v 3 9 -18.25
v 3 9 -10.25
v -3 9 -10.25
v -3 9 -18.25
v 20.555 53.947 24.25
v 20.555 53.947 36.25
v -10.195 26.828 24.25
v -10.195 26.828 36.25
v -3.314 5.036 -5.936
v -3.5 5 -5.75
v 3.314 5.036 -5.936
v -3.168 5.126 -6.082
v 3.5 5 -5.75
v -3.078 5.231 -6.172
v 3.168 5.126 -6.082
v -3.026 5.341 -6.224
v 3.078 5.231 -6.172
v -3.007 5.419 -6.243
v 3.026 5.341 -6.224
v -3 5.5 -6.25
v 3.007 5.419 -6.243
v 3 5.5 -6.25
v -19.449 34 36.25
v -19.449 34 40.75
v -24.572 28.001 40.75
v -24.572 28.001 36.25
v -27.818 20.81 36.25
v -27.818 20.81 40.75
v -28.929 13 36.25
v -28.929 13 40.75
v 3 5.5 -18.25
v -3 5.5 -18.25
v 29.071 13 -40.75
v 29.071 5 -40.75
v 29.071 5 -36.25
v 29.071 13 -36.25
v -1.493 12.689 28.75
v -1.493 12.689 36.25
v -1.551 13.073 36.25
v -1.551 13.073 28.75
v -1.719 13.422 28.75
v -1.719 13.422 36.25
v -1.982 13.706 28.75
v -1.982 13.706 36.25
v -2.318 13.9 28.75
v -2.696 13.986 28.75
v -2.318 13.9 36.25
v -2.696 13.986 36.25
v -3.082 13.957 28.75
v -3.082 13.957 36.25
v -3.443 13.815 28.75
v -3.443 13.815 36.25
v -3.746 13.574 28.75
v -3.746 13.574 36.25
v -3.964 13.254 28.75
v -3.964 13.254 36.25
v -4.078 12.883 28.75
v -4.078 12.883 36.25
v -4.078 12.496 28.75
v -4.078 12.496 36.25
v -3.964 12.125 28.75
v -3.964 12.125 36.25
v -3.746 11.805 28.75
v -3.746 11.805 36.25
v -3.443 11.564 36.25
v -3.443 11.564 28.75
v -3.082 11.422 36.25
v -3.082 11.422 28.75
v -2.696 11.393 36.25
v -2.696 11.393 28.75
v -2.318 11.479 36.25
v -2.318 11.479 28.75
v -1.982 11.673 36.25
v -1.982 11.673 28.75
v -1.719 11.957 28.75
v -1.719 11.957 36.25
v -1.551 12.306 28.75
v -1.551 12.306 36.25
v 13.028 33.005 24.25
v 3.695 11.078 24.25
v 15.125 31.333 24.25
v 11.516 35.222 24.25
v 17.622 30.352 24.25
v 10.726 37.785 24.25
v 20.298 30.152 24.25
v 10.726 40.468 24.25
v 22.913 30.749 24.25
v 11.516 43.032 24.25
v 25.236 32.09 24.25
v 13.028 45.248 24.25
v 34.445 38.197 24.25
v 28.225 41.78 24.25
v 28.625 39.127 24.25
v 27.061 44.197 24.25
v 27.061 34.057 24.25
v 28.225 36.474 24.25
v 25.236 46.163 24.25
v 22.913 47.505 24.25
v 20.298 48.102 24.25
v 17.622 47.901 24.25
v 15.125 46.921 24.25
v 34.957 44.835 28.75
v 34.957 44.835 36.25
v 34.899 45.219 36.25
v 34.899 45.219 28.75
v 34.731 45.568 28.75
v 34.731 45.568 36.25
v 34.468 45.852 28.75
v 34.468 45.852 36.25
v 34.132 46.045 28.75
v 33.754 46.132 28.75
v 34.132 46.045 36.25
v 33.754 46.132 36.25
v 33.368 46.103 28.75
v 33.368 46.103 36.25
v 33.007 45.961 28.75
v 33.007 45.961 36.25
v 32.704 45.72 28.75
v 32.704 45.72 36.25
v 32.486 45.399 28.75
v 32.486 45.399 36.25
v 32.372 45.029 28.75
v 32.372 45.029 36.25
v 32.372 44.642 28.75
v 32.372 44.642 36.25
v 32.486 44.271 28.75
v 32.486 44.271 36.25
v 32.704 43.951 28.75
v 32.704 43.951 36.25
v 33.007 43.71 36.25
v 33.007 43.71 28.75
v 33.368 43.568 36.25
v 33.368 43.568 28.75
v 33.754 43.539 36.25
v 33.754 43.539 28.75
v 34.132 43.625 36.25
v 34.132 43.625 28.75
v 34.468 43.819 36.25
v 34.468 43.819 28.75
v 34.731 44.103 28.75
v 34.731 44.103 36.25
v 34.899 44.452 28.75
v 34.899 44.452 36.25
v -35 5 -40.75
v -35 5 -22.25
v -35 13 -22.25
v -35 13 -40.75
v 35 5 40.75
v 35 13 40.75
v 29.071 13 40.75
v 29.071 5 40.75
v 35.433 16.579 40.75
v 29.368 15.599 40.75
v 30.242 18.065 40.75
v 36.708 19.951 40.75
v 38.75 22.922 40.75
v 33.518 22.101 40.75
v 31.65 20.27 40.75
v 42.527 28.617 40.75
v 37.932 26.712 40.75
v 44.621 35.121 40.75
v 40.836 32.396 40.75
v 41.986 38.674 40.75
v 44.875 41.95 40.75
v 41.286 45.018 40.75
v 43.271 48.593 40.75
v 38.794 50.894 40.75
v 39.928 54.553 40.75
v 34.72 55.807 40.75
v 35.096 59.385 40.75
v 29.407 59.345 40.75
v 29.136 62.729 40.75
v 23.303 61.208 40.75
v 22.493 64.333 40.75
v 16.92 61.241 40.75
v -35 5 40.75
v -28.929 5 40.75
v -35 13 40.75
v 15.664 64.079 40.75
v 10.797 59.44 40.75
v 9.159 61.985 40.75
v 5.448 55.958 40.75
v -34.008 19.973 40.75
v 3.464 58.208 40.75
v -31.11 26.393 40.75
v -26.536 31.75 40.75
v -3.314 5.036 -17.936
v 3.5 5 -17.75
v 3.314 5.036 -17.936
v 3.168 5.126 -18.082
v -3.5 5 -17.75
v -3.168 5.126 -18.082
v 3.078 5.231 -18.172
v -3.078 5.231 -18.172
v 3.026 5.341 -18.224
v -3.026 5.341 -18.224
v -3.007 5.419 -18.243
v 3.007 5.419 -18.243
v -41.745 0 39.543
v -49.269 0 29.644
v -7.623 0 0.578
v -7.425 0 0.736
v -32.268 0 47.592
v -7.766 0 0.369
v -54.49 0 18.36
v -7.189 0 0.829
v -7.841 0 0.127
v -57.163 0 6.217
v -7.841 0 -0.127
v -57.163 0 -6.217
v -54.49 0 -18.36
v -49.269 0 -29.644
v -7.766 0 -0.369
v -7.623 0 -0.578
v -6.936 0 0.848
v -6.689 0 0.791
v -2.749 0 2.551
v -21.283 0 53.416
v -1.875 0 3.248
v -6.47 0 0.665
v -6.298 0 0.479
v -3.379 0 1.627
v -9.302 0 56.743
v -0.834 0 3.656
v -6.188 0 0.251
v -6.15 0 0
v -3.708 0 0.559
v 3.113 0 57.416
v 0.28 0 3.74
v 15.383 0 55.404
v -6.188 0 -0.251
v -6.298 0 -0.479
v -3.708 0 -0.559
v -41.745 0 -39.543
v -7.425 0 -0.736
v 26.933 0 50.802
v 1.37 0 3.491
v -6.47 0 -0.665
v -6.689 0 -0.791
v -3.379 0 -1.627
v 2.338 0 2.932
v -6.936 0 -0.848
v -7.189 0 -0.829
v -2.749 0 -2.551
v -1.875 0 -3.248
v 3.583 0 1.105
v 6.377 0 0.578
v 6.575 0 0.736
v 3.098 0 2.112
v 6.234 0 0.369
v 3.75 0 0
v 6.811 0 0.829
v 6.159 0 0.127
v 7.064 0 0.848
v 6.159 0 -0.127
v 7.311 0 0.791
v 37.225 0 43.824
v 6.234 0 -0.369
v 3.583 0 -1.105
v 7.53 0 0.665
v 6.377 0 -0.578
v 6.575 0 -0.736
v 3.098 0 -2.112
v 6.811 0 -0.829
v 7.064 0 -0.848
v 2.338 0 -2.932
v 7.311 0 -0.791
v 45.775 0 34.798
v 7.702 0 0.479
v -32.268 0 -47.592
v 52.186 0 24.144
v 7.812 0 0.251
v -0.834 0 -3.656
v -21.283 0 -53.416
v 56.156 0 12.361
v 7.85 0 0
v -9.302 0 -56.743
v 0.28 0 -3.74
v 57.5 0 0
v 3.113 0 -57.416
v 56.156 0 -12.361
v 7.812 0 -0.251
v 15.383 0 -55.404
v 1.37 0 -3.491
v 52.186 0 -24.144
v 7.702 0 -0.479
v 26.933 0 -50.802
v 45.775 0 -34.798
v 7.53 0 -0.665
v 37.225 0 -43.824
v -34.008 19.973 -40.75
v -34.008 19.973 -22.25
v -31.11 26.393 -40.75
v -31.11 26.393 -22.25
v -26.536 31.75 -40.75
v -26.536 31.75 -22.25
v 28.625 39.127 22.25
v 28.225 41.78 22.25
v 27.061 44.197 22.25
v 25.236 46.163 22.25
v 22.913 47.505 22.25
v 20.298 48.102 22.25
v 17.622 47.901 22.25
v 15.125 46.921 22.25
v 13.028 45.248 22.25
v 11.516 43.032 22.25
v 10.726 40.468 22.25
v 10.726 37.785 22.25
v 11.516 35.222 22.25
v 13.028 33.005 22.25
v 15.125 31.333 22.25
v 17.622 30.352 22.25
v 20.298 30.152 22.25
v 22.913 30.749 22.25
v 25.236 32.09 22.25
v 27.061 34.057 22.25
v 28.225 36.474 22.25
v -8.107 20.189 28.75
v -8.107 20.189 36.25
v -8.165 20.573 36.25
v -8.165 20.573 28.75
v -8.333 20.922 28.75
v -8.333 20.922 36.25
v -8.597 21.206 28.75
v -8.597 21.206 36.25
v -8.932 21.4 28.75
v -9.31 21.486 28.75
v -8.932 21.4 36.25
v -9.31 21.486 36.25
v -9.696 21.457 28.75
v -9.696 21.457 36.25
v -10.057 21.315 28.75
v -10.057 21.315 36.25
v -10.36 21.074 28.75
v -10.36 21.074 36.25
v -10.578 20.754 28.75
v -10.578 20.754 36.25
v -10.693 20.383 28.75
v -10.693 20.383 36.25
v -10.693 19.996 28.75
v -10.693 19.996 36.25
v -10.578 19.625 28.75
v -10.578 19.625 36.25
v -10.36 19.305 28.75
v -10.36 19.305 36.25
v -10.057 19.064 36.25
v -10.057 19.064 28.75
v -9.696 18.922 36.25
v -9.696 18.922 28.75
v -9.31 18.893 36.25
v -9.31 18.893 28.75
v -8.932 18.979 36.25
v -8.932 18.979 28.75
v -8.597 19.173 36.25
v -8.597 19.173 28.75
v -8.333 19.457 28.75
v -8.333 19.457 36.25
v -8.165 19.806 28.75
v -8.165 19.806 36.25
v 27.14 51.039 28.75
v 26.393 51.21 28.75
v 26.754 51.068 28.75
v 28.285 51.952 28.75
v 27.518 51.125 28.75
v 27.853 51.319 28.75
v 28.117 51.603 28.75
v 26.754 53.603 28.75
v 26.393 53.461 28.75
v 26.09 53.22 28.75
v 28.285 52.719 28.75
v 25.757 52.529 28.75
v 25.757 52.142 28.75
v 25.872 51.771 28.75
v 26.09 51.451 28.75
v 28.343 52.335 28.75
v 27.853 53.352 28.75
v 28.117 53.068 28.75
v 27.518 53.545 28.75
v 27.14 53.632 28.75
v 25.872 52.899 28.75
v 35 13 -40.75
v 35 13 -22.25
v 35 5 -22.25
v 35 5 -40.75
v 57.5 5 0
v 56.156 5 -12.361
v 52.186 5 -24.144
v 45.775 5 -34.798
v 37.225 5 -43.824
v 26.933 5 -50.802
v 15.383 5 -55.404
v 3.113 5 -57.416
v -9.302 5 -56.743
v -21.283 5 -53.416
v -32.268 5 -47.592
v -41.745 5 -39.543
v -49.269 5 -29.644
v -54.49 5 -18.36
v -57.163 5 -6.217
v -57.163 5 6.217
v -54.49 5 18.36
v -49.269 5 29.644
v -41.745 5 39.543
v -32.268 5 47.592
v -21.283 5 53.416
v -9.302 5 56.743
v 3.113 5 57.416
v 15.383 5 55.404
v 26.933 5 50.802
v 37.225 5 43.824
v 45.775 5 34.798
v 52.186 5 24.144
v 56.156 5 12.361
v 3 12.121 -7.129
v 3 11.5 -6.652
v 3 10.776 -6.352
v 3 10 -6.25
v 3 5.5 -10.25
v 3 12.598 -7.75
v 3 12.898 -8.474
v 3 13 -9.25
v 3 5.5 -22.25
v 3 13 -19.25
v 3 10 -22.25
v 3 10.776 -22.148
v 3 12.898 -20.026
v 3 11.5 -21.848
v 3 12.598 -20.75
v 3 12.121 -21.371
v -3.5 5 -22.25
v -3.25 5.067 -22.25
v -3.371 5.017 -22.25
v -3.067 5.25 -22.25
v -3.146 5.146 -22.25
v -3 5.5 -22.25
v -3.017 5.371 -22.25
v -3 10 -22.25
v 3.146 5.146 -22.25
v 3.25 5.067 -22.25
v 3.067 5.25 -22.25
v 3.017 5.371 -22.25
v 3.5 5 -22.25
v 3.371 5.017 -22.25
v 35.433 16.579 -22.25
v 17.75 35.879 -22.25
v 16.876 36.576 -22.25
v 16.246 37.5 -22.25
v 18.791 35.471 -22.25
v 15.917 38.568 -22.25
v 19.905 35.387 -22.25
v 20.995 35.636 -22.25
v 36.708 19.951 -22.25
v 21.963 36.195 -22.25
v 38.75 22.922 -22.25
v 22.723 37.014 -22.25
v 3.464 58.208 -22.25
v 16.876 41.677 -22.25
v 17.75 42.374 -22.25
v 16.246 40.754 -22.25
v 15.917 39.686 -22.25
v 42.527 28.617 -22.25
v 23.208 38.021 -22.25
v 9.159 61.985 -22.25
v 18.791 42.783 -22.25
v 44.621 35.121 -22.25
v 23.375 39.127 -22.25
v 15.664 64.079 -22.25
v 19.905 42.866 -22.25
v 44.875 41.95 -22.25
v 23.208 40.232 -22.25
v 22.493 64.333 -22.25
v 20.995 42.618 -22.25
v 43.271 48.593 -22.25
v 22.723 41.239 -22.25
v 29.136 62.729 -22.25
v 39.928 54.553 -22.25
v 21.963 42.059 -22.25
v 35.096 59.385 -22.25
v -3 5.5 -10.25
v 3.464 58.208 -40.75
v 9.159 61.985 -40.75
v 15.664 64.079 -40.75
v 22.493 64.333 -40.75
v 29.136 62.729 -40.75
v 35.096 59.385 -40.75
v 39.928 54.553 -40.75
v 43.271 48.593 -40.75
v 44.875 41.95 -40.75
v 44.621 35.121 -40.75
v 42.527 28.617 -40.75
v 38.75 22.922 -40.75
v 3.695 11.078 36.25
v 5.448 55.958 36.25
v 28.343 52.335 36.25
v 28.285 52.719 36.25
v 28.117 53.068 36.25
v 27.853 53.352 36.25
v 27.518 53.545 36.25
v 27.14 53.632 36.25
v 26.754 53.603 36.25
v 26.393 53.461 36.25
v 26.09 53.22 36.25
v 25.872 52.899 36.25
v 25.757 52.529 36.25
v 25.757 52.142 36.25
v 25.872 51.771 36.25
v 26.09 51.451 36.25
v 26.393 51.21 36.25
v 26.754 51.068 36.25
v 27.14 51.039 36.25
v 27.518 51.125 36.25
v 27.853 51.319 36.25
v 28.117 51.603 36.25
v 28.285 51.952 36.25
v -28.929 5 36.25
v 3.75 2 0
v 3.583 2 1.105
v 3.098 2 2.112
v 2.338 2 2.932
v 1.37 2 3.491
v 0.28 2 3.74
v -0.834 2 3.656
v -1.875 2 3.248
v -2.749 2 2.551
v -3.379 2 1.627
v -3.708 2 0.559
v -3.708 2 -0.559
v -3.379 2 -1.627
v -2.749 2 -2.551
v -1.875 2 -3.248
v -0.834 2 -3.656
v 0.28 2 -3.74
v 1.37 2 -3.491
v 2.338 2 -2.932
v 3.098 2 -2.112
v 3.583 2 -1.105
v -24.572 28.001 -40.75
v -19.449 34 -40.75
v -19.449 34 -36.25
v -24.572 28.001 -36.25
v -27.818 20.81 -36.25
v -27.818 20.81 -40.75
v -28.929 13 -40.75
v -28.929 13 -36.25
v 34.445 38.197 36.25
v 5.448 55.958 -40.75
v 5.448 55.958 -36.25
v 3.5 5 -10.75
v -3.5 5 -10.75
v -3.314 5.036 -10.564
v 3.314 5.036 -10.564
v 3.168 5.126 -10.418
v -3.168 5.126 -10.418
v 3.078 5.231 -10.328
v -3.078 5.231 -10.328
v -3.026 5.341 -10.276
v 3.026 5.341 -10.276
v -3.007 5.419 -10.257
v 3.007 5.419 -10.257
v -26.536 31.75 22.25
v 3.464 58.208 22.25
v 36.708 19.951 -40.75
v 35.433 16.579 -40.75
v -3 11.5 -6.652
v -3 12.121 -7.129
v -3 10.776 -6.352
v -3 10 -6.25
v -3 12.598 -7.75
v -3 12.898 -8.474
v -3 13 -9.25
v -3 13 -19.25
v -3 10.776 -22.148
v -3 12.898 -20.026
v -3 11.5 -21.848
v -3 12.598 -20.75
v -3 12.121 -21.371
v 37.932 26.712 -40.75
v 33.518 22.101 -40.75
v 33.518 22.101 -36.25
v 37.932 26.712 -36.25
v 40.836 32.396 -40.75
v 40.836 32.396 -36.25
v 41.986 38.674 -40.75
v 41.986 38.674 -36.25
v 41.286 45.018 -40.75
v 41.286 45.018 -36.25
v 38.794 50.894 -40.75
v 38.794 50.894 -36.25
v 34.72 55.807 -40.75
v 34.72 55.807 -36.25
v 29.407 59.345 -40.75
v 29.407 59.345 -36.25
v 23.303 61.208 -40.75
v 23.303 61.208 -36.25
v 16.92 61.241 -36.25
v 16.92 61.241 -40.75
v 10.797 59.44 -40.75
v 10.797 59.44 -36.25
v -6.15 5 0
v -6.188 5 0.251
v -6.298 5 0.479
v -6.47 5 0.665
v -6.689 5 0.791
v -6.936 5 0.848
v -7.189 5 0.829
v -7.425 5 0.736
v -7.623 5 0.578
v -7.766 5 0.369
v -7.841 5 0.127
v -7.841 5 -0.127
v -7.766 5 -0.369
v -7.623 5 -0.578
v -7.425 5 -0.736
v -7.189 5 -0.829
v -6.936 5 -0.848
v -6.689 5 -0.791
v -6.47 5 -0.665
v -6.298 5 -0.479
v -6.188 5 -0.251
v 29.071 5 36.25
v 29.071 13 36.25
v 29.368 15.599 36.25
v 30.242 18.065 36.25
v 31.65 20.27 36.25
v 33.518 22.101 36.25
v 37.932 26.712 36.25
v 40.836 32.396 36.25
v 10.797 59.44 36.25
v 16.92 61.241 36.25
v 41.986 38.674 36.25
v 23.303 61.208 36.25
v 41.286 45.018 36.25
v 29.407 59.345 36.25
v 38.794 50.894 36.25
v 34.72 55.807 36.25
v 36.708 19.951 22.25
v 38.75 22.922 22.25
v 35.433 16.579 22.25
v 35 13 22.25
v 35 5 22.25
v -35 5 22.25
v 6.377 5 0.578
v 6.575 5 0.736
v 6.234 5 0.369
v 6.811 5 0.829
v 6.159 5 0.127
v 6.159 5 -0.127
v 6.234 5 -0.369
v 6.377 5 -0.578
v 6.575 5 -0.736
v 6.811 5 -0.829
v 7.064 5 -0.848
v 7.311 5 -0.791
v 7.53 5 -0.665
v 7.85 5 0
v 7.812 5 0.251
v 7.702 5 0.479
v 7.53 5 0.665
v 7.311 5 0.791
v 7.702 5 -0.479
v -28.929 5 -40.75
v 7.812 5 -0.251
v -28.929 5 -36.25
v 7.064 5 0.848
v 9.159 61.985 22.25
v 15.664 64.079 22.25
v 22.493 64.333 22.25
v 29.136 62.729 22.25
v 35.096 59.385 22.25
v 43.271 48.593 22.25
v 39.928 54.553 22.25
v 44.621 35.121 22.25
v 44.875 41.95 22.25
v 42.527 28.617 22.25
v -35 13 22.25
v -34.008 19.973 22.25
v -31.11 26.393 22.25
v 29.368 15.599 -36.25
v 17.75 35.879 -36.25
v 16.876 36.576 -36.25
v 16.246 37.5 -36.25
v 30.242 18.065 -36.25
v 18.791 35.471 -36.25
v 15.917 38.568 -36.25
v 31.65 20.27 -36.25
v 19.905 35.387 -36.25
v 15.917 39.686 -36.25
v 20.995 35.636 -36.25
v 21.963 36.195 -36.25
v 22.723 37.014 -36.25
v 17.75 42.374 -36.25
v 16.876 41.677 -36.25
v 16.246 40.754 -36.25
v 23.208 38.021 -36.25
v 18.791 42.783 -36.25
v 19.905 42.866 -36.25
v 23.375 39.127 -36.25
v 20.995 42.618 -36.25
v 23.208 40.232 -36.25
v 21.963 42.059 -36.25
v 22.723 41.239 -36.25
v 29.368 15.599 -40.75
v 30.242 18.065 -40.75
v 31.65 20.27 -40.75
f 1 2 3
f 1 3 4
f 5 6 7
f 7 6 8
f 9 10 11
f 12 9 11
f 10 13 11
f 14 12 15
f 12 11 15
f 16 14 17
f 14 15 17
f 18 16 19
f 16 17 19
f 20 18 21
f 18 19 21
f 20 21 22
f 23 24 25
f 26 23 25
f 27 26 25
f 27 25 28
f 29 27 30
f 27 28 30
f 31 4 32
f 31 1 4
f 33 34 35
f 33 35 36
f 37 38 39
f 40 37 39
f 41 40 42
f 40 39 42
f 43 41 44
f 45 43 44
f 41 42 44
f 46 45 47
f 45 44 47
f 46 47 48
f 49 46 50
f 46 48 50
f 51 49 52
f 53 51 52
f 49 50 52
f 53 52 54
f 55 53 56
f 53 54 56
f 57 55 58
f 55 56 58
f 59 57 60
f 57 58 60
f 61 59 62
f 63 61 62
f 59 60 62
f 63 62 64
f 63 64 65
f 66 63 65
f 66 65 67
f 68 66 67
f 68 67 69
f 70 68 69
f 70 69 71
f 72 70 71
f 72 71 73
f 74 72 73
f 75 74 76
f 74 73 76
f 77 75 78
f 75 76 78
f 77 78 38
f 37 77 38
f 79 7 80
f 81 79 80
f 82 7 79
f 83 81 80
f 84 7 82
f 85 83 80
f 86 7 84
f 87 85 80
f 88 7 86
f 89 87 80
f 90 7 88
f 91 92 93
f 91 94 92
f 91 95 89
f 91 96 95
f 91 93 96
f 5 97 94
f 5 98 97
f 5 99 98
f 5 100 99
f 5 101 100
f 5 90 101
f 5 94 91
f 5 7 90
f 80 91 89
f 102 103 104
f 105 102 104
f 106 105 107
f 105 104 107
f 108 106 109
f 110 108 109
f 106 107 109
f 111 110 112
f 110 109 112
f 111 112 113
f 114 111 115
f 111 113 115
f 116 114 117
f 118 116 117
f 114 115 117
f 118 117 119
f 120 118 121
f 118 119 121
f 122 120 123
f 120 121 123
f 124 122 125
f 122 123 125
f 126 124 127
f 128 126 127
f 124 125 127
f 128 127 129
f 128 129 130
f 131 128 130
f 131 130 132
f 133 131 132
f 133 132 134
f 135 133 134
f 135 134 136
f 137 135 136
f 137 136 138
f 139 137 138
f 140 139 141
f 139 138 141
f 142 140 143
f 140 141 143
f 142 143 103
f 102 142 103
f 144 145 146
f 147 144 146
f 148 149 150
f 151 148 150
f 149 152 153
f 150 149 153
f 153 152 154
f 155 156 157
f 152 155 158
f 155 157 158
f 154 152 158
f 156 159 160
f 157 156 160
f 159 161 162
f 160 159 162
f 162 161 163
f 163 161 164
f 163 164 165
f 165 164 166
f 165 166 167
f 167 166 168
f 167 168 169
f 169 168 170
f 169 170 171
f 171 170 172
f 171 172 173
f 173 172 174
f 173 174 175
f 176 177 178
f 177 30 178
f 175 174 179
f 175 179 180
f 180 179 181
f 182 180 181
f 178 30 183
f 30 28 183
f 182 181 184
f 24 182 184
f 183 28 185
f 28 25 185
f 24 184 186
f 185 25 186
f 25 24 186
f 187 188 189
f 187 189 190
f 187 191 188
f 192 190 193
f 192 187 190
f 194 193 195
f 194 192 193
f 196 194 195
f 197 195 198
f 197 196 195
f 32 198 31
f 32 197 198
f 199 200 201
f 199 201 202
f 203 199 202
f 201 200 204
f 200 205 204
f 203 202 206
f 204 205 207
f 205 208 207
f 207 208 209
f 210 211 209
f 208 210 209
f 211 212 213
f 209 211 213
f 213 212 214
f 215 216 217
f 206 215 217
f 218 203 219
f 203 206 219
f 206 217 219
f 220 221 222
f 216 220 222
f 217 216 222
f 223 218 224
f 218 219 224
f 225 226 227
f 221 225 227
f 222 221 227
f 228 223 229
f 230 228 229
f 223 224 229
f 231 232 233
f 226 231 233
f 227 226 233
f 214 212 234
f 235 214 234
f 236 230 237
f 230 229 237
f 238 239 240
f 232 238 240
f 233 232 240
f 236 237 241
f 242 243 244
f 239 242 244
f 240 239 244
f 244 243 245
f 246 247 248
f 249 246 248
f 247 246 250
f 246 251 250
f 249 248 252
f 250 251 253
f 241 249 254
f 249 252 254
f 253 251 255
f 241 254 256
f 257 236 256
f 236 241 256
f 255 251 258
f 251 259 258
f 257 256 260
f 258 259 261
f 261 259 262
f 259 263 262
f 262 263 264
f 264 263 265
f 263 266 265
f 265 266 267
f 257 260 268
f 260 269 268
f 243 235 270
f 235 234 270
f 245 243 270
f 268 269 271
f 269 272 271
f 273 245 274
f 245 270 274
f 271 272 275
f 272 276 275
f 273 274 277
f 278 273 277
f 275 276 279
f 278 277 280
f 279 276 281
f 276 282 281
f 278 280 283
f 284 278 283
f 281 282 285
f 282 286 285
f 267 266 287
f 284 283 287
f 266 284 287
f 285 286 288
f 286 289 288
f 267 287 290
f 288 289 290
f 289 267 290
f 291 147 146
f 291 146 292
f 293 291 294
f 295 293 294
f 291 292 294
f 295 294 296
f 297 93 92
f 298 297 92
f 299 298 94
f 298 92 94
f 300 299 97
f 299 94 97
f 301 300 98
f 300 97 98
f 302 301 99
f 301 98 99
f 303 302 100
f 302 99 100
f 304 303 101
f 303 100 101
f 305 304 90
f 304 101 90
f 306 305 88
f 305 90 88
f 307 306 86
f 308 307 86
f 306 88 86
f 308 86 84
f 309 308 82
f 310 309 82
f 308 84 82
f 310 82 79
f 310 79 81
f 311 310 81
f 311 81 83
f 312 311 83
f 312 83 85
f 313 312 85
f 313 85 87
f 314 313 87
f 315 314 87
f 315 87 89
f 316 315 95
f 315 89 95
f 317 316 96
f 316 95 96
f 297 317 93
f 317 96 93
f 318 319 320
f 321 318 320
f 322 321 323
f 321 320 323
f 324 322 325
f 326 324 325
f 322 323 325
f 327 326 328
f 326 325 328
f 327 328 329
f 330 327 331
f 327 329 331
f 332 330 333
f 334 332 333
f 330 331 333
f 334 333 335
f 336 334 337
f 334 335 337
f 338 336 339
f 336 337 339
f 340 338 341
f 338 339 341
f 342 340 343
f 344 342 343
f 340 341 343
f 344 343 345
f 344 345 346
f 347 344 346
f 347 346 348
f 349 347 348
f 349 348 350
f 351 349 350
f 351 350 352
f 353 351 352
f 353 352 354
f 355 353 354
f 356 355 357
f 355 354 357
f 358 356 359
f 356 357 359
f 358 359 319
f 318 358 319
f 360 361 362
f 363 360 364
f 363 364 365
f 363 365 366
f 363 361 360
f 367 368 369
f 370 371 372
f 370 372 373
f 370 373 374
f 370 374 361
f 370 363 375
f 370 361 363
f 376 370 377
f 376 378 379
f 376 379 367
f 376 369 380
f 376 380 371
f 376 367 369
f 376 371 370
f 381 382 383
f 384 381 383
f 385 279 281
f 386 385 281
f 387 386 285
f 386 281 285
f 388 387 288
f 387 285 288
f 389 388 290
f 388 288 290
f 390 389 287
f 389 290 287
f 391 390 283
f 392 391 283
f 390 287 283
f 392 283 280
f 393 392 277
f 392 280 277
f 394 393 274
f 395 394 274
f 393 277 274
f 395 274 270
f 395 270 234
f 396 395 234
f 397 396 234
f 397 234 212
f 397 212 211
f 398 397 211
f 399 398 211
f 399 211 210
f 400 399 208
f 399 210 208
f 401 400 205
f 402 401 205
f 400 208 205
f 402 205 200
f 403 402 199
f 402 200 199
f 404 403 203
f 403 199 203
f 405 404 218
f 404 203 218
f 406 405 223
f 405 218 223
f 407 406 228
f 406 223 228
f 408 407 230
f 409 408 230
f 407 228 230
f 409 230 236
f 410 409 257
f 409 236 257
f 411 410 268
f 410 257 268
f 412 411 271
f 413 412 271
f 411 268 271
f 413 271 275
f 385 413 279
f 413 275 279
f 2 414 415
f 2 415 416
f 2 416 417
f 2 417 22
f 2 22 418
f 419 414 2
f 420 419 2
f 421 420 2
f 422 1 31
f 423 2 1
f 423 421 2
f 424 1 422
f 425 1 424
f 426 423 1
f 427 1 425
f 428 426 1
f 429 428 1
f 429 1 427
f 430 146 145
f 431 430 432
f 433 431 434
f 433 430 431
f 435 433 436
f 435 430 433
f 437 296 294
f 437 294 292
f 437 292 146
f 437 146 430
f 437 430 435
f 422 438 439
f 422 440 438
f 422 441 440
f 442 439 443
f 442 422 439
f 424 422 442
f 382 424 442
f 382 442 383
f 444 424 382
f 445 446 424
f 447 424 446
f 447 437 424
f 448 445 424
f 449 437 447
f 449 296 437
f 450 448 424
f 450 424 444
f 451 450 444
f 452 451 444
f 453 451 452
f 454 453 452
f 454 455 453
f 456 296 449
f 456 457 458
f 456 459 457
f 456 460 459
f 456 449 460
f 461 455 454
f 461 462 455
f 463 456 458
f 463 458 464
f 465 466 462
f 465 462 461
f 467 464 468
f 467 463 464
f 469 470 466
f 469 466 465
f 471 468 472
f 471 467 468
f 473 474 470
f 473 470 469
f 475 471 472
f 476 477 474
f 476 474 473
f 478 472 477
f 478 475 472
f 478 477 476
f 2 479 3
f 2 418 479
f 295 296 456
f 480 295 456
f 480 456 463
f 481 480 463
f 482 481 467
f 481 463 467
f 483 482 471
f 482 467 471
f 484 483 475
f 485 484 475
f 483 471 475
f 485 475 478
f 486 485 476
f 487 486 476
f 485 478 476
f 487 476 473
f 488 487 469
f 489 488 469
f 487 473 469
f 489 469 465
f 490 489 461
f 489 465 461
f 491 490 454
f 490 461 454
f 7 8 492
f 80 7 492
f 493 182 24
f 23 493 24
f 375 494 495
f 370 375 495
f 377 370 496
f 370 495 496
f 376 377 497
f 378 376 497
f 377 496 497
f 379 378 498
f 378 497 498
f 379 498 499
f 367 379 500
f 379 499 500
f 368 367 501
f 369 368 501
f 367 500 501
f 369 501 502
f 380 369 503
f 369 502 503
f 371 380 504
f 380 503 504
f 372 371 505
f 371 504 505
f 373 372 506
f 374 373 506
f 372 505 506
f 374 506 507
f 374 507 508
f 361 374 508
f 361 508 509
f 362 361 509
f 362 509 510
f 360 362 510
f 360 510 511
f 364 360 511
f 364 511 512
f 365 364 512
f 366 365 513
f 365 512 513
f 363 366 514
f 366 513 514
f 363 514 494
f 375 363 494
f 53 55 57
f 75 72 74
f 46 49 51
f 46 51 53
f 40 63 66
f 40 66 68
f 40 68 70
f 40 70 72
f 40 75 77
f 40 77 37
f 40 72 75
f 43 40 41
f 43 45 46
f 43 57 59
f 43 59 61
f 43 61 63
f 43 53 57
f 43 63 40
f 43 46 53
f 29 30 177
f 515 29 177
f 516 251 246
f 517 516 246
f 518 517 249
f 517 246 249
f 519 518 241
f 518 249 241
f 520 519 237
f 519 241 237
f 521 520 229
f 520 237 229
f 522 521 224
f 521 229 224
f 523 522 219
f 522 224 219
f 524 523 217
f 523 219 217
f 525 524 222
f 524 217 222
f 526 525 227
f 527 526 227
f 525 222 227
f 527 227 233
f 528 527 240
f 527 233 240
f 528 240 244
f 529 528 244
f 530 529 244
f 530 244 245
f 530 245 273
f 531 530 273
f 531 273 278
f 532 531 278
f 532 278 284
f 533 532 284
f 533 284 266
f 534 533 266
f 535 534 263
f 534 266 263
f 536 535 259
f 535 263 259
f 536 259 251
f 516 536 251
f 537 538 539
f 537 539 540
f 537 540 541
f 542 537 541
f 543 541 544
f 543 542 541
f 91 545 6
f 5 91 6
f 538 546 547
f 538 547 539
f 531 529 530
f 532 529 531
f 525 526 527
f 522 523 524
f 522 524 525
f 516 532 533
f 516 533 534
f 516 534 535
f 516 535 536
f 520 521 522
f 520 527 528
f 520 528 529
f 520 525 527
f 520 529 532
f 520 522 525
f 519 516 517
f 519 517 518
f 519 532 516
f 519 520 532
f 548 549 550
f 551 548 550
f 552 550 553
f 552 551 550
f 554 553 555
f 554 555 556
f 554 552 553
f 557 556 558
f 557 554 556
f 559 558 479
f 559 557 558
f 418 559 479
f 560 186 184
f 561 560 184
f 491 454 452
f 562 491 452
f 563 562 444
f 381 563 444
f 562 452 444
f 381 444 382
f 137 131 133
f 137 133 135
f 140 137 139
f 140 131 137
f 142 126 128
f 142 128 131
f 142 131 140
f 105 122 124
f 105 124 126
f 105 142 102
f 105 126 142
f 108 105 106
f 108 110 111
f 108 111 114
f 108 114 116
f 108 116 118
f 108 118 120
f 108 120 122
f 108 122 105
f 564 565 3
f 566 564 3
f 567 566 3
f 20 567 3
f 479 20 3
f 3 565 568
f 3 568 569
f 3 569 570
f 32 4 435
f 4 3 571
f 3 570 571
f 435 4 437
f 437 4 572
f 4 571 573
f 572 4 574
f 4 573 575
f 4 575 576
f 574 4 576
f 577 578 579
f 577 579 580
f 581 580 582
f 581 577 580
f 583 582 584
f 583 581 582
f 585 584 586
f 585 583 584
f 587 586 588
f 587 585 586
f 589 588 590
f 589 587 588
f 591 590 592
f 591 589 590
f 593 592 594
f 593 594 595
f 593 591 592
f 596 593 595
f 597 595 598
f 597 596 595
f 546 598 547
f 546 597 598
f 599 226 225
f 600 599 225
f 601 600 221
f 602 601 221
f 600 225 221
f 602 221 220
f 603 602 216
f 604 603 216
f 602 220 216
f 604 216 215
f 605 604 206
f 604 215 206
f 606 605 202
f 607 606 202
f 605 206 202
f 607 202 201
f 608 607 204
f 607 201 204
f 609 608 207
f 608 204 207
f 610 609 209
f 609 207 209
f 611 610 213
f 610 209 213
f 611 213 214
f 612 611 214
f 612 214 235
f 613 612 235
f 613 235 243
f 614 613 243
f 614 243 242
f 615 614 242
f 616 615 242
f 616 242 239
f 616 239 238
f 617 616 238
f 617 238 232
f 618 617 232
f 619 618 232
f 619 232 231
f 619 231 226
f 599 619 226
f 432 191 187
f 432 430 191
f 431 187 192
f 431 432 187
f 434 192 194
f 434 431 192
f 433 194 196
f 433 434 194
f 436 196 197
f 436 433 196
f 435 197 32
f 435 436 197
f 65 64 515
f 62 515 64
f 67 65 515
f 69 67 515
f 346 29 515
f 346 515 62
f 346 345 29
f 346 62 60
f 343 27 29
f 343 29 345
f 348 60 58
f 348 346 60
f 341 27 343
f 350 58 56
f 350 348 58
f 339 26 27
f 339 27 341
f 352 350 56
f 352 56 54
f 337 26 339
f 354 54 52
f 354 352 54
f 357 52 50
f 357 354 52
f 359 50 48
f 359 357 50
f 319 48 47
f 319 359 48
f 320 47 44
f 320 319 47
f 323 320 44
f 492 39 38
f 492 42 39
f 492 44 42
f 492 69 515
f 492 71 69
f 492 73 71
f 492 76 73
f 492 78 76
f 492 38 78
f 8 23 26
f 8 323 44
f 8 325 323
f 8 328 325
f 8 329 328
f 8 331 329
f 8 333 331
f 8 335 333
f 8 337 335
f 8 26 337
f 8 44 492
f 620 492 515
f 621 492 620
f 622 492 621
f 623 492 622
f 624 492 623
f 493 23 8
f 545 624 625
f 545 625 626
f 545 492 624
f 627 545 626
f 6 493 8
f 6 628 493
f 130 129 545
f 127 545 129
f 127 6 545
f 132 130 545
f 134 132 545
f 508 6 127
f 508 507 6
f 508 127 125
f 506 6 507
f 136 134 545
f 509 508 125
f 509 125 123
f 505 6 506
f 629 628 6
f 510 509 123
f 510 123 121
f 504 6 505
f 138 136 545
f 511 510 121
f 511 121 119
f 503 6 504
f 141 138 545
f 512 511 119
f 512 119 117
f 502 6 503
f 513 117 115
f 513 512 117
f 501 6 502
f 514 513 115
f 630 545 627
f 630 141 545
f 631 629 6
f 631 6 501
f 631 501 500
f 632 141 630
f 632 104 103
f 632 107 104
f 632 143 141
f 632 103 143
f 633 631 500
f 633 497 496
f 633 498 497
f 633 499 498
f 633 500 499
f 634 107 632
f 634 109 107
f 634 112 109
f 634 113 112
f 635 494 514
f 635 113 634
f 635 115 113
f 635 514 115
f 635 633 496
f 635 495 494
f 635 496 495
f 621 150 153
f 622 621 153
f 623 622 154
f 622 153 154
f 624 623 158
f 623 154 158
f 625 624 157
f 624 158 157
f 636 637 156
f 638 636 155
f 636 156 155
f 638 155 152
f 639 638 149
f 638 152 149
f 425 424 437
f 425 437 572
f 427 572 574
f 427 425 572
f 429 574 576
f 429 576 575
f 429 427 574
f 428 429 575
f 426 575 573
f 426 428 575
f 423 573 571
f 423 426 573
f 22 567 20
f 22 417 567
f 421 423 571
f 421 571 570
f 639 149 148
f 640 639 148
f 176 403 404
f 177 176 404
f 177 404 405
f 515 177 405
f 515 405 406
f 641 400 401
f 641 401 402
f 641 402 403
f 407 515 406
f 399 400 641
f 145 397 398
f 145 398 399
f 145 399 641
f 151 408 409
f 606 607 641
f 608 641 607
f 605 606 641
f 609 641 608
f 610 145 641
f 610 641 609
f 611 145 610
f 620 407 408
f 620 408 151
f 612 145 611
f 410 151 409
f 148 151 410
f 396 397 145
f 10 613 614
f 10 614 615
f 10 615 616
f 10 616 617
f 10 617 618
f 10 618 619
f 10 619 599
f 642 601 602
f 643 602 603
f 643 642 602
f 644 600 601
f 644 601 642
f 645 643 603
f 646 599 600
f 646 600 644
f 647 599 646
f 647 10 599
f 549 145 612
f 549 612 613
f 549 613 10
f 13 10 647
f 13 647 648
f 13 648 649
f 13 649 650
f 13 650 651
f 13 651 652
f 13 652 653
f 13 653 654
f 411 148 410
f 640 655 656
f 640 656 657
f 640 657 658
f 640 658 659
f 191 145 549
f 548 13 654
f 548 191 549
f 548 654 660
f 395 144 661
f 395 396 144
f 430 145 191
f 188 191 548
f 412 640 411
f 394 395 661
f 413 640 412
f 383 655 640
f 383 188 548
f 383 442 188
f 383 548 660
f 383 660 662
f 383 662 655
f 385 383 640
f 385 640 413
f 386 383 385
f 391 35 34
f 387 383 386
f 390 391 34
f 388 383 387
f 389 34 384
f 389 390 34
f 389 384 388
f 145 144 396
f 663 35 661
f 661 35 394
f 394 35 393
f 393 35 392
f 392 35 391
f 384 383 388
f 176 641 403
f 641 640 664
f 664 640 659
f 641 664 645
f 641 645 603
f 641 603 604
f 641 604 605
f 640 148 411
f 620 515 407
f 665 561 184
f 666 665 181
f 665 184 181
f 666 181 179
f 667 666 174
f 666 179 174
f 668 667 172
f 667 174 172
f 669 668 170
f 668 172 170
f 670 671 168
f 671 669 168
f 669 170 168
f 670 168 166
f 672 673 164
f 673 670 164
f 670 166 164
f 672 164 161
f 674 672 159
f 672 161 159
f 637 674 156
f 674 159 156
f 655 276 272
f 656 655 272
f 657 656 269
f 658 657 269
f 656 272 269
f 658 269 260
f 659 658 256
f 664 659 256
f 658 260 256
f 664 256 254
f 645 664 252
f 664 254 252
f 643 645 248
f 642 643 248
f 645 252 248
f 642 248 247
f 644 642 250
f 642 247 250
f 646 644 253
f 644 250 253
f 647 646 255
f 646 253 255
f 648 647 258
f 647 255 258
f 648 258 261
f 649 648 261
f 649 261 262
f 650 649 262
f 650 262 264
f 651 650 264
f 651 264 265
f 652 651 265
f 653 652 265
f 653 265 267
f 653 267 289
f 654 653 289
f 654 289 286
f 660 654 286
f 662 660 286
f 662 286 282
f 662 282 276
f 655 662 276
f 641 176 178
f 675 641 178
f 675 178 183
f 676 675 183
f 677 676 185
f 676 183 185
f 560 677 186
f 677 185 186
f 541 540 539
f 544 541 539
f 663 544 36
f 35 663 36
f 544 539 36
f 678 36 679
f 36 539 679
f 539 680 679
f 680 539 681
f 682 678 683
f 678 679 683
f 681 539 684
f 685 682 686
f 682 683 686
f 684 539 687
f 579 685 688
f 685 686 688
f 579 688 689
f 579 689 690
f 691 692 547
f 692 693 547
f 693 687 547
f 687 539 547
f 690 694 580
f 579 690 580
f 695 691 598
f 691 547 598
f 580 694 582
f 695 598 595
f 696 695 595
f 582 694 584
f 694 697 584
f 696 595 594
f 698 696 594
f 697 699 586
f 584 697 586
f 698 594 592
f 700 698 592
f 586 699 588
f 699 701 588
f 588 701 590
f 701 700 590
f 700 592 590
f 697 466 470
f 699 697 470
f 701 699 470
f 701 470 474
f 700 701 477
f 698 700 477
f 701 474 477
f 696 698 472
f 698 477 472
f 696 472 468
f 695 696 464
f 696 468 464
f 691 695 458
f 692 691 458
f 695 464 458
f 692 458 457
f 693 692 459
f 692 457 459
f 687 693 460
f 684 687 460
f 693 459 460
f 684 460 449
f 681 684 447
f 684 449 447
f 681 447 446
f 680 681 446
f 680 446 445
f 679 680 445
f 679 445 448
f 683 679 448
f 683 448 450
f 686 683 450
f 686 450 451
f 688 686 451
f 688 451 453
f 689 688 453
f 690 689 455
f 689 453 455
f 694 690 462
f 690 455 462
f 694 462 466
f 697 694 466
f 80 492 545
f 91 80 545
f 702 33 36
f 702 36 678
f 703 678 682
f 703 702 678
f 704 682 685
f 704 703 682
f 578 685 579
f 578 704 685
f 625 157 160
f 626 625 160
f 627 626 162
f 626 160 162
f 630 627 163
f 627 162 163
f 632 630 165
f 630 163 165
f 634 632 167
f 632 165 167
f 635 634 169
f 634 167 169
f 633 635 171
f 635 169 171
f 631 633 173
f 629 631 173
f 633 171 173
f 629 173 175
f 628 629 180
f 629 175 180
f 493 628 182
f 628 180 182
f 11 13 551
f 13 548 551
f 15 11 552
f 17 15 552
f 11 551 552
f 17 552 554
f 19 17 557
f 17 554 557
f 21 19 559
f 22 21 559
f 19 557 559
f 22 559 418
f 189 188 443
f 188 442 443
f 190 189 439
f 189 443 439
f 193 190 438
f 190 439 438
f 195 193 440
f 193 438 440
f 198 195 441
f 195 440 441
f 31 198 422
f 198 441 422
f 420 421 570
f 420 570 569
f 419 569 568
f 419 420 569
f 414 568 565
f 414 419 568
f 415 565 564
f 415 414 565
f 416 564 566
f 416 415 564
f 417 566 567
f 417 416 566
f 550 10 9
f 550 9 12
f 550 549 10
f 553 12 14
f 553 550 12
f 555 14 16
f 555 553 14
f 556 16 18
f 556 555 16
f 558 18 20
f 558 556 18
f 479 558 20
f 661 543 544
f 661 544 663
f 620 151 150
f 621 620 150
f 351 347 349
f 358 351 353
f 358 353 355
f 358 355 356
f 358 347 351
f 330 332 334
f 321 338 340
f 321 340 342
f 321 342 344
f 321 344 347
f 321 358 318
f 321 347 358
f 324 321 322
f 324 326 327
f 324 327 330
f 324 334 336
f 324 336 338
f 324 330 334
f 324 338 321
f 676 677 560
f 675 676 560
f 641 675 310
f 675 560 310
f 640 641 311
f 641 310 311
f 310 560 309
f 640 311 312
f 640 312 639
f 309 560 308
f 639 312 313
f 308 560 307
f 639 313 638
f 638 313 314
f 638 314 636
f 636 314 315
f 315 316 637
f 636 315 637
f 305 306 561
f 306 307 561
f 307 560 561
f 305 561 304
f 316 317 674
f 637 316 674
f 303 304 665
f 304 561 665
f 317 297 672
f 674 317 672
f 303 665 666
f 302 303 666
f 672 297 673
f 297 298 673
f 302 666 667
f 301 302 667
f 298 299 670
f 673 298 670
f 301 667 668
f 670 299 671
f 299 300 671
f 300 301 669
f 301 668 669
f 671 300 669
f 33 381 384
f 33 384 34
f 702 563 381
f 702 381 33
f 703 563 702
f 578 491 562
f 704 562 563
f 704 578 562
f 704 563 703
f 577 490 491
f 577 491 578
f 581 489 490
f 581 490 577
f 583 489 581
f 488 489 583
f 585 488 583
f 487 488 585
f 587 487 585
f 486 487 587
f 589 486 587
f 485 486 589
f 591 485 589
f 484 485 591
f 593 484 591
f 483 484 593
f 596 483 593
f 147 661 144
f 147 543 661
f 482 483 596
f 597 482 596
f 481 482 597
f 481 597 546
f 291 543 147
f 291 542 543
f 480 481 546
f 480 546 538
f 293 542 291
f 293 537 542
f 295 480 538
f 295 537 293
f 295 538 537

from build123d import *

# Parameters (mm, degrees)
SKETCH1_R           = 57.5
BOSS_EXTRUDE1_DEPTH = 5
BOSS_EXTRUDE2_DEPTH = 40.75
CUT_EXTRUDE1_DEPTH  = 22.25
CUT_EXTRUDE2_DEPTH  = 4.5
CUT_EXTRUDE3_DEPTH  = 12
SKETCH7_R           = 9
CUT_EXTRUDE5_DEPTH  = 2
SKETCH8_R           = 1.3
CUT_EXTRUDE6_DEPTH  = 7.5
SKETCH10_R          = 3.75
CUT_EXTRUDE7_DEPTH  = 14
SKETCH11_R          = 3.75
CUT_EXTRUDE8_DEPTH  = 2
CUT_EXTRUDE9_REACH  = 66.458
SKETCH12_R          = 0.85
BOSS_EXTRUDE3_DEPTH = 3
FILLET1_R           = 0.5


with BuildPart() as part:
    # Sketch1 → Boss-Extrude1 (new body)
    with BuildSketch(Plane(origin=(0, 0, 0), x_dir=(1, 0, 0), z_dir=(0, 1, 0))):
        Circle(SKETCH1_R)
    extrude(amount=BOSS_EXTRUDE1_DEPTH)

    # Sketch2 → Boss-Extrude2 (add, symmetric)
    with BuildSketch(Plane.XY):
        with BuildLine():
            Line((-35, 5), (-35, 13))
            ThreePointArc((-35, 13), (-32.785945694, 23.285945694), (-26.535945694, 31.75))
            Line((-26.535945694, 31.75), (3.464054306, 58.207513111))
            ThreePointArc((3.464054306, 58.207513111), (37.67766953, 57.13518264), (38.75, 22.921567416))
            ThreePointArc((38.75, 22.921567416), (35.9687848, 18.303300859), (35, 13))
            Line((35, 13), (35, 5))
            Line((35, 5), (-35, 5))
        make_face()
    extrude(amount=BOSS_EXTRUDE2_DEPTH, both=True)

    # Sketch4 → Cut-Extrude1 (cut, symmetric)
    with BuildSketch(Plane.XY):
        with BuildLine():
            Line((3.464054306, 58.207513111), (-26.535945694, 31.75))
            ThreePointArc((-26.535945694, 31.75), (-32.785945694, 23.285945694), (-35, 13))
            Line((-35, 13), (-35, 5))
            Line((-35, 5), (35, 5))
            Line((35, 5), (35, 13))
            ThreePointArc((35, 13), (35.9687848, 18.303300859), (38.75, 22.921567416))
            ThreePointArc((38.75, 22.921567416), (37.67766953, 57.13518264), (3.464054306, 58.207513111))
        make_face()
    extrude(amount=CUT_EXTRUDE1_DEPTH, both=True, mode=Mode.SUBTRACT)

    # Sketch5 → Cut-Extrude2 (cut)
    with BuildSketch(Plane.XY.offset(40.75)):
        with BuildLine():
            Line((5.448367789, 55.957513111), (-19.449111825, 34))
            ThreePointArc((-19.449111825, 34), (-26.449111825, 24.520259177), (-28.928852648, 13))
            Line((-28.928852648, 13), (-28.928852648, 5))
            Line((-28.928852648, 5), (29.071147352, 5))
            Line((29.071147352, 5), (29.071147352, 13))
            ThreePointArc((29.071147352, 13), (30.242434209, 18.064703602), (33.518438806, 22.100905947))
            ThreePointArc((33.518438806, 22.100905947), (36.936184172, 53.499082314), (5.448367789, 55.957513111))
        make_face()
    cut_extrude2 = extrude(amount=-CUT_EXTRUDE2_DEPTH, mode=Mode.SUBTRACT)

    # Mirror1: Cut-Extrude2 across plane
    add(cut_extrude2.mirror(Plane.XY), mode=Mode.SUBTRACT)

    # Sketch6 → Cut-Extrude3 (cut)
    with BuildSketch(Plane.XY.offset(36.25)):
        Polygon((20.554902808, 53.946891388), (-10.195097192, 26.82794045), (3.695097192, 11.07794045), (34.445097192, 38.196891388), align=None)
    extrude(amount=-CUT_EXTRUDE3_DEPTH, mode=Mode.SUBTRACT)

    # Sketch7 → Cut-Extrude5 (cut)
    with BuildSketch(Plane.XY.offset(24.25)):
        with Locations((19.625, 39.126794197)):
            Circle(SKETCH7_R)
    extrude(amount=-CUT_EXTRUDE5_DEPTH, mode=Mode.SUBTRACT)

    # Sketch8 → Cut-Extrude6 (cut)
    with BuildSketch(Plane.XY.offset(36.25)):
        with Locations((27.042810861, 52.335355134)):
            Circle(SKETCH8_R)
        with Locations((33.657189139, 44.835355134)):
            Circle(SKETCH8_R)
        with Locations((-9.407189139, 20.189476704)):
            Circle(SKETCH8_R)
        with Locations((-2.792810861, 12.689476704)):
            Circle(SKETCH8_R)
    extrude(amount=-CUT_EXTRUDE6_DEPTH, mode=Mode.SUBTRACT)

    # Sketch10 → Cut-Extrude7 (cut)
    with BuildSketch(Plane.XY.offset(-22.25)):
        with Locations((19.625, 39.126794197)):
            Circle(SKETCH10_R)
    extrude(amount=-CUT_EXTRUDE7_DEPTH, mode=Mode.SUBTRACT)

    # Sketch11 → Cut-Extrude8 (cut)
    with BuildSketch(Plane.XZ):
        Circle(SKETCH11_R)
    extrude(amount=-CUT_EXTRUDE8_DEPTH, mode=Mode.SUBTRACT)

    # Sketch12 → Cut-Extrude9 (cut, up to next)
    with BuildSketch(Plane.XZ, mode=Mode.PRIVATE) as cut_extrude9_sk1:
        with Locations((7, 0)):
            Circle(SKETCH12_R)
    cut_extrude9_tool1 = extrude(cut_extrude9_sk1.sketch, amount=-CUT_EXTRUDE9_REACH, mode=Mode.PRIVATE) & part.part
    add(cut_extrude9_tool1.solids().sort_by_distance((7, 0, 0))[0], mode=Mode.SUBTRACT)
    # Sketch12 → Cut-Extrude9 (cut, up to next)
    with BuildSketch(Plane.XZ, mode=Mode.PRIVATE) as cut_extrude9_sk2:
        with Locations((-7, 0)):
            Circle(SKETCH12_R)
    cut_extrude9_tool2 = extrude(cut_extrude9_sk2.sketch, amount=-CUT_EXTRUDE9_REACH, mode=Mode.PRIVATE) & part.part
    add(cut_extrude9_tool2.solids().sort_by_distance((-7, 0, 0))[0], mode=Mode.SUBTRACT)

    # Sketch13 → Boss-Extrude3 (add, symmetric)
    with BuildSketch(Plane(origin=(0, 0, 0), x_dir=(0, 0, -1), z_dir=(1, 0, 0))):
        with BuildLine():
            Line((22.25, 5), (22.25, 10))
            ThreePointArc((22.25, 10), (21.371320344, 12.121320344), (19.25, 13))
            Line((19.25, 13), (9.25, 13))
            ThreePointArc((9.25, 13), (7.128679656, 12.121320344), (6.25, 10))
            Line((6.25, 10), (6.25, 5))
            Line((6.25, 5), (10.25, 5))
            Line((10.25, 5), (10.25, 9))
            Line((10.25, 9), (18.25, 9))
            Line((18.25, 9), (18.25, 5))
            Line((18.25, 5), (22.25, 5))
        make_face()
    extrude(amount=BOSS_EXTRUDE3_DEPTH, both=True)

    # Fillet1
    fillet1_edges = [part.edges().sort_by_distance(p)[0] for p in [
        (-3, 5, -20.25),
        (0, 5, -18.25),
        (-3, 5, -8.25),
        (0, 5, -6.25),
        (0, 5, -10.25),
        (3, 5, -20.25),
        (3, 5, -8.25),
    ]]
    fillet(fillet1_edges, radius=FILLET1_R)


solid = part.part
